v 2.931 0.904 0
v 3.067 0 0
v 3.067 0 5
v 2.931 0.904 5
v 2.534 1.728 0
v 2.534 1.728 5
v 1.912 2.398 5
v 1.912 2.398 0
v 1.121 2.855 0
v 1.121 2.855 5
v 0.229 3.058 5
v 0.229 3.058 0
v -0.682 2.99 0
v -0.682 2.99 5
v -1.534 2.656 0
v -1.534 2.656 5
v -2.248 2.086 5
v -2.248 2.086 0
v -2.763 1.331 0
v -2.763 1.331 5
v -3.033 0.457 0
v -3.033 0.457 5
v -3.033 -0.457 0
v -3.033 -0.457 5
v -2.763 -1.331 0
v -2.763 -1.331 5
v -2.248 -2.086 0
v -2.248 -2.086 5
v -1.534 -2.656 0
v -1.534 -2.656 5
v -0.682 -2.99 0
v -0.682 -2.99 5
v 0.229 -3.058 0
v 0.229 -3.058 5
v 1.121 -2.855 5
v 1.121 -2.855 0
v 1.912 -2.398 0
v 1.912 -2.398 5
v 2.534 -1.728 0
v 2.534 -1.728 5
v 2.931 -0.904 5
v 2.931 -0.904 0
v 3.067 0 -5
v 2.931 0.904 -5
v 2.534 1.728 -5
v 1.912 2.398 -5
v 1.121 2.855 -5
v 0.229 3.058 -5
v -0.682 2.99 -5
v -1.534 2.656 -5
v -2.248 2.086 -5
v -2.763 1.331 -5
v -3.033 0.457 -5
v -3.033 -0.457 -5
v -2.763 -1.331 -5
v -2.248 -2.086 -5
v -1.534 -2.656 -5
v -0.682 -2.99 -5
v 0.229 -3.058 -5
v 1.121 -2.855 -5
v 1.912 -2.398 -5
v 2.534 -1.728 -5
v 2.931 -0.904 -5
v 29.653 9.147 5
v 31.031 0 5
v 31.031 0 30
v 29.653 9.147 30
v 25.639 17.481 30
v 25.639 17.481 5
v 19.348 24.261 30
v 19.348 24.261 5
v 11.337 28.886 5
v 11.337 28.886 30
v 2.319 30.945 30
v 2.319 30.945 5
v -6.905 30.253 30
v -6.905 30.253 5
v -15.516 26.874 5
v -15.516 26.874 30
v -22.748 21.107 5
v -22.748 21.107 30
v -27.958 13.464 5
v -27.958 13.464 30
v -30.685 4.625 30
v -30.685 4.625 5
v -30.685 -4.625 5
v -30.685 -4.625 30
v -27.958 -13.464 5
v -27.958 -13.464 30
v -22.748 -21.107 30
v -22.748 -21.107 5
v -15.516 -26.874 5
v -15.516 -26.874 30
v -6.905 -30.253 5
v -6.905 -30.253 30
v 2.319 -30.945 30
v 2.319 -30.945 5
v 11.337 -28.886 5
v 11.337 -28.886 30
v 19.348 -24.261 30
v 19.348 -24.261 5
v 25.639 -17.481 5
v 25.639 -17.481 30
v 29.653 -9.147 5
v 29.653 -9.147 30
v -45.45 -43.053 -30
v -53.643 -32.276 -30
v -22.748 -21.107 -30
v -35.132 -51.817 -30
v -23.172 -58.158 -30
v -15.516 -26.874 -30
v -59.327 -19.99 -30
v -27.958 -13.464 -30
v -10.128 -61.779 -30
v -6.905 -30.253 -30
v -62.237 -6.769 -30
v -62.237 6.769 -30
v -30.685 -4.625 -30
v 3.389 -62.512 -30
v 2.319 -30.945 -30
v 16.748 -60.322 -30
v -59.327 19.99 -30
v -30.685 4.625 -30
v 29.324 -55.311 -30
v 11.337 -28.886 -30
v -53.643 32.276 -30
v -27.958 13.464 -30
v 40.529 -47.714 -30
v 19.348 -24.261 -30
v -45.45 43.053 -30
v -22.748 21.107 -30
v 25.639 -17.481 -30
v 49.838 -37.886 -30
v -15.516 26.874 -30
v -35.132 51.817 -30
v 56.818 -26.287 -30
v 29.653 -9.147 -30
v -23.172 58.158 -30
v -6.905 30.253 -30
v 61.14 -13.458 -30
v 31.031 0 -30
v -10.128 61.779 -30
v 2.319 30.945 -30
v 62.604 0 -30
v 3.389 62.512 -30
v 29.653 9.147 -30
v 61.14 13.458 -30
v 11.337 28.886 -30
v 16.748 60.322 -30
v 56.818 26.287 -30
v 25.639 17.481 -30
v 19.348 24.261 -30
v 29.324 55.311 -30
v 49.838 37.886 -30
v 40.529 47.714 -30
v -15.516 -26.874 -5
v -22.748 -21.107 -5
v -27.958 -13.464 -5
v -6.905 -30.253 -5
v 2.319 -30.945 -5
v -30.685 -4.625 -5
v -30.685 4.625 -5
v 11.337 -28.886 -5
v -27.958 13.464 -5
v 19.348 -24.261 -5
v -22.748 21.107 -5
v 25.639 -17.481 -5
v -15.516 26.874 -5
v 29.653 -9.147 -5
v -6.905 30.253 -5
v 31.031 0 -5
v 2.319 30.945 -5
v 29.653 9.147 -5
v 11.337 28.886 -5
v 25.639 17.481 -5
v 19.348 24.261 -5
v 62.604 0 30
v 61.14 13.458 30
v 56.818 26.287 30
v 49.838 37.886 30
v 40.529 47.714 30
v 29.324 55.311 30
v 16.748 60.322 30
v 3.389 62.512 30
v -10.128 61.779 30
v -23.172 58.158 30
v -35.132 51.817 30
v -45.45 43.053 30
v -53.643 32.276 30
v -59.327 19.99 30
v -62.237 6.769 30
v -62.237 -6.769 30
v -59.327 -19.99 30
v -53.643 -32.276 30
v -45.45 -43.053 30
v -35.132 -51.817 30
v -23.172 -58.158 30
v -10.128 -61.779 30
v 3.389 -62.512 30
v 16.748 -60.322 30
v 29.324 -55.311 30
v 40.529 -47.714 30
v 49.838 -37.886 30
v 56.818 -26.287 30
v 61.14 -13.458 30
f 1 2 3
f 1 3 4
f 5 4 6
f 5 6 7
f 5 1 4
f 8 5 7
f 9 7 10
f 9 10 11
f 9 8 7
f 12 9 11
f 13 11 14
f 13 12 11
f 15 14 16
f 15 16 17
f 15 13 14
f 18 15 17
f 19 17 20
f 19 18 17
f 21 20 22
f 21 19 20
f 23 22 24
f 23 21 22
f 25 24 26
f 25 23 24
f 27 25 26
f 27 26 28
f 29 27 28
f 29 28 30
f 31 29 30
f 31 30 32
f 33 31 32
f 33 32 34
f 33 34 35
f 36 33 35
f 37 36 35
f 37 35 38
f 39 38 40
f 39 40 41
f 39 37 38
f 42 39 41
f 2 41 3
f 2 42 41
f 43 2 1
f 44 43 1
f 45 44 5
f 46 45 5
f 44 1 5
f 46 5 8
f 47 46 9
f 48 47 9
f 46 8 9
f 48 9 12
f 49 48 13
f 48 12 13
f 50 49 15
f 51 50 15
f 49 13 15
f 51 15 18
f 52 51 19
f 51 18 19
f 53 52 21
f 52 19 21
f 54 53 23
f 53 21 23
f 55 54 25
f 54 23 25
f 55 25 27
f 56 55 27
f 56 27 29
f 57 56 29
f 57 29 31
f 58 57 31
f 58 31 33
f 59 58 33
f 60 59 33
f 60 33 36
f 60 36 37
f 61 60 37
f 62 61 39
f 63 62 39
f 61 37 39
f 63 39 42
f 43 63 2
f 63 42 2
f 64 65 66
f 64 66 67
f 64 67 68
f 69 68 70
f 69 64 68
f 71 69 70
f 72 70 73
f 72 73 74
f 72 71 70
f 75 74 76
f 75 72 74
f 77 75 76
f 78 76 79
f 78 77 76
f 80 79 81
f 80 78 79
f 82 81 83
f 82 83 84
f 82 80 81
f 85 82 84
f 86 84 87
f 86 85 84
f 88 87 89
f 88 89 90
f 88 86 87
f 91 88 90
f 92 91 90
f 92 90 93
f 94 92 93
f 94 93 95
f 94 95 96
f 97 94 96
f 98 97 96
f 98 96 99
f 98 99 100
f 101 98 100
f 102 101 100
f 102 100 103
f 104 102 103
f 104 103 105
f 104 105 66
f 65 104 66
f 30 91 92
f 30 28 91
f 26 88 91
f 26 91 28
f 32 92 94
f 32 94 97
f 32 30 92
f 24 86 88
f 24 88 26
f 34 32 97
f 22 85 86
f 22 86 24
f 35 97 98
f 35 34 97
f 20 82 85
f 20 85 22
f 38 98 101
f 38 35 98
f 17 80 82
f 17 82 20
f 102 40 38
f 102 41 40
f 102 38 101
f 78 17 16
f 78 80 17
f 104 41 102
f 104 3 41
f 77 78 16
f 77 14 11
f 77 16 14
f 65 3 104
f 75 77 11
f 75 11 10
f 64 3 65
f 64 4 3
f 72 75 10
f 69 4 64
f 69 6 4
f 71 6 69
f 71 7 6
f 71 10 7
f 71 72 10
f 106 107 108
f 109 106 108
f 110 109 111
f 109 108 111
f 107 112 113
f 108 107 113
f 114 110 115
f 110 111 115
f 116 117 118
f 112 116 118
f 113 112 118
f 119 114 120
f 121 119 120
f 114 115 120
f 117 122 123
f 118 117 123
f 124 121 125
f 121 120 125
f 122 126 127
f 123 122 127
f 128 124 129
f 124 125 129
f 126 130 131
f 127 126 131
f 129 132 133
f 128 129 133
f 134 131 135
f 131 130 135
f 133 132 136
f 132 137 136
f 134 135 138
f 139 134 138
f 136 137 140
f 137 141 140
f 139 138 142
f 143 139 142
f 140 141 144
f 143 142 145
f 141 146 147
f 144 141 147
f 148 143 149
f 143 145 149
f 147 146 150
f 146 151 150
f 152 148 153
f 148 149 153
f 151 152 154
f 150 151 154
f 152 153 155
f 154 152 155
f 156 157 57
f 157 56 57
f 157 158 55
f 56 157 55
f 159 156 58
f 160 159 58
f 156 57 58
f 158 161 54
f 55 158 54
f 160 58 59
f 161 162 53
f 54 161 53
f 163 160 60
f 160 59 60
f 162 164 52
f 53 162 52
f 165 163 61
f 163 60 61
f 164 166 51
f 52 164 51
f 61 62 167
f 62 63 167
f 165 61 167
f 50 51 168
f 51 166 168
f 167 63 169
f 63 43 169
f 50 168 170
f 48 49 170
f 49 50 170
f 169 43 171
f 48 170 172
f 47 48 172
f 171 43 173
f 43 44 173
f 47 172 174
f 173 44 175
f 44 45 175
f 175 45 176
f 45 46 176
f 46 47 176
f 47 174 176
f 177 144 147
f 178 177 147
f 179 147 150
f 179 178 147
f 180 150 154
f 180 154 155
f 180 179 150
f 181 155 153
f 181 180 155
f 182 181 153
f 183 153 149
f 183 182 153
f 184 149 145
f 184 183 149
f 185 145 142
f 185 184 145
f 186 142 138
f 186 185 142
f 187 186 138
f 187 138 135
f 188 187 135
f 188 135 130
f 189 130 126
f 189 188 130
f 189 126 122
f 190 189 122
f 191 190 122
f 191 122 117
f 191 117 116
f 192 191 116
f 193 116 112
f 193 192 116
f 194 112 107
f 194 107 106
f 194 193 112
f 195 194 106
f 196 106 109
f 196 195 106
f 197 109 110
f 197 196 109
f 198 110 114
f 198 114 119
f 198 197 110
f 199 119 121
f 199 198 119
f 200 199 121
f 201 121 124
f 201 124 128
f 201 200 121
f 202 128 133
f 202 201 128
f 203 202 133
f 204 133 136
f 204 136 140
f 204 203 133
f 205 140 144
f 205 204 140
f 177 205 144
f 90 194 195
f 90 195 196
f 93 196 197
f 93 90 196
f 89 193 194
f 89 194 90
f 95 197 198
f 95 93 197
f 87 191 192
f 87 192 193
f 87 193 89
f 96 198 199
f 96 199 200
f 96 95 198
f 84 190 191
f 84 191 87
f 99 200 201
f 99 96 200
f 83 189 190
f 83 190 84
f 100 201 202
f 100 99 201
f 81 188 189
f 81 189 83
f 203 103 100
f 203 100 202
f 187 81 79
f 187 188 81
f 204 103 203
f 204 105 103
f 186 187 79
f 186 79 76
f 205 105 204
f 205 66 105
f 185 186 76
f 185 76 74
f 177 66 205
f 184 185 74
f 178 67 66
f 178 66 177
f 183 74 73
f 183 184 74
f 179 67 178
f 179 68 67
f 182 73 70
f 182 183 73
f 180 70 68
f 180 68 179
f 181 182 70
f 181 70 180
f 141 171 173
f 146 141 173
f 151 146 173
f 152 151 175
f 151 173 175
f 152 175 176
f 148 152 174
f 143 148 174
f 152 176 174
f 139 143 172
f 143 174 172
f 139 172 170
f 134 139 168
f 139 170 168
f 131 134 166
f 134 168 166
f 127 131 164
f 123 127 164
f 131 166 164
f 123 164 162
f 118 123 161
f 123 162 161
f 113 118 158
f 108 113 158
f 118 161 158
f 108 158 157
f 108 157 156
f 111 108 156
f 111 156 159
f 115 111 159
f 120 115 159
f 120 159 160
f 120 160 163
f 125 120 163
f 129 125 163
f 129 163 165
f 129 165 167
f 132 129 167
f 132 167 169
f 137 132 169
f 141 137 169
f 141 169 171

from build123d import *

# Parameters (mm, degrees)
SKETCH1_R           = 31.031300013
SKETCH1_R_2         = 3.067047094
EXTRUDE3_DEPTH      = 5
EXTRUDE3_DEPTH_BACK = 5
SKETCH1_6_R         = 62.603843631
SKETCH1_6_R_2       = 31.031300013
EXTRUDE4_DEPTH      = 30
EXTRUDE4_DEPTH_BACK = 30


with BuildPart() as part:
    # Sketch1 → Extrude3 (new body, two sides)
    with BuildSketch(Plane.XY) as extrude3_sk:
        Circle(SKETCH1_R)
        Circle(SKETCH1_R_2, mode=Mode.SUBTRACT)
    extrude(amount=EXTRUDE3_DEPTH)
    extrude(extrude3_sk.sketch, amount=-EXTRUDE3_DEPTH_BACK)

    # Sketch1_6 → Extrude4 (add, two sides)
    with BuildSketch(Plane.XY) as extrude4_sk:
        Circle(SKETCH1_6_R)
        Circle(SKETCH1_6_R_2, mode=Mode.SUBTRACT)
    extrude(amount=EXTRUDE4_DEPTH)
    extrude(extrude4_sk.sketch, amount=-EXTRUDE4_DEPTH_BACK)


solid = part.part
